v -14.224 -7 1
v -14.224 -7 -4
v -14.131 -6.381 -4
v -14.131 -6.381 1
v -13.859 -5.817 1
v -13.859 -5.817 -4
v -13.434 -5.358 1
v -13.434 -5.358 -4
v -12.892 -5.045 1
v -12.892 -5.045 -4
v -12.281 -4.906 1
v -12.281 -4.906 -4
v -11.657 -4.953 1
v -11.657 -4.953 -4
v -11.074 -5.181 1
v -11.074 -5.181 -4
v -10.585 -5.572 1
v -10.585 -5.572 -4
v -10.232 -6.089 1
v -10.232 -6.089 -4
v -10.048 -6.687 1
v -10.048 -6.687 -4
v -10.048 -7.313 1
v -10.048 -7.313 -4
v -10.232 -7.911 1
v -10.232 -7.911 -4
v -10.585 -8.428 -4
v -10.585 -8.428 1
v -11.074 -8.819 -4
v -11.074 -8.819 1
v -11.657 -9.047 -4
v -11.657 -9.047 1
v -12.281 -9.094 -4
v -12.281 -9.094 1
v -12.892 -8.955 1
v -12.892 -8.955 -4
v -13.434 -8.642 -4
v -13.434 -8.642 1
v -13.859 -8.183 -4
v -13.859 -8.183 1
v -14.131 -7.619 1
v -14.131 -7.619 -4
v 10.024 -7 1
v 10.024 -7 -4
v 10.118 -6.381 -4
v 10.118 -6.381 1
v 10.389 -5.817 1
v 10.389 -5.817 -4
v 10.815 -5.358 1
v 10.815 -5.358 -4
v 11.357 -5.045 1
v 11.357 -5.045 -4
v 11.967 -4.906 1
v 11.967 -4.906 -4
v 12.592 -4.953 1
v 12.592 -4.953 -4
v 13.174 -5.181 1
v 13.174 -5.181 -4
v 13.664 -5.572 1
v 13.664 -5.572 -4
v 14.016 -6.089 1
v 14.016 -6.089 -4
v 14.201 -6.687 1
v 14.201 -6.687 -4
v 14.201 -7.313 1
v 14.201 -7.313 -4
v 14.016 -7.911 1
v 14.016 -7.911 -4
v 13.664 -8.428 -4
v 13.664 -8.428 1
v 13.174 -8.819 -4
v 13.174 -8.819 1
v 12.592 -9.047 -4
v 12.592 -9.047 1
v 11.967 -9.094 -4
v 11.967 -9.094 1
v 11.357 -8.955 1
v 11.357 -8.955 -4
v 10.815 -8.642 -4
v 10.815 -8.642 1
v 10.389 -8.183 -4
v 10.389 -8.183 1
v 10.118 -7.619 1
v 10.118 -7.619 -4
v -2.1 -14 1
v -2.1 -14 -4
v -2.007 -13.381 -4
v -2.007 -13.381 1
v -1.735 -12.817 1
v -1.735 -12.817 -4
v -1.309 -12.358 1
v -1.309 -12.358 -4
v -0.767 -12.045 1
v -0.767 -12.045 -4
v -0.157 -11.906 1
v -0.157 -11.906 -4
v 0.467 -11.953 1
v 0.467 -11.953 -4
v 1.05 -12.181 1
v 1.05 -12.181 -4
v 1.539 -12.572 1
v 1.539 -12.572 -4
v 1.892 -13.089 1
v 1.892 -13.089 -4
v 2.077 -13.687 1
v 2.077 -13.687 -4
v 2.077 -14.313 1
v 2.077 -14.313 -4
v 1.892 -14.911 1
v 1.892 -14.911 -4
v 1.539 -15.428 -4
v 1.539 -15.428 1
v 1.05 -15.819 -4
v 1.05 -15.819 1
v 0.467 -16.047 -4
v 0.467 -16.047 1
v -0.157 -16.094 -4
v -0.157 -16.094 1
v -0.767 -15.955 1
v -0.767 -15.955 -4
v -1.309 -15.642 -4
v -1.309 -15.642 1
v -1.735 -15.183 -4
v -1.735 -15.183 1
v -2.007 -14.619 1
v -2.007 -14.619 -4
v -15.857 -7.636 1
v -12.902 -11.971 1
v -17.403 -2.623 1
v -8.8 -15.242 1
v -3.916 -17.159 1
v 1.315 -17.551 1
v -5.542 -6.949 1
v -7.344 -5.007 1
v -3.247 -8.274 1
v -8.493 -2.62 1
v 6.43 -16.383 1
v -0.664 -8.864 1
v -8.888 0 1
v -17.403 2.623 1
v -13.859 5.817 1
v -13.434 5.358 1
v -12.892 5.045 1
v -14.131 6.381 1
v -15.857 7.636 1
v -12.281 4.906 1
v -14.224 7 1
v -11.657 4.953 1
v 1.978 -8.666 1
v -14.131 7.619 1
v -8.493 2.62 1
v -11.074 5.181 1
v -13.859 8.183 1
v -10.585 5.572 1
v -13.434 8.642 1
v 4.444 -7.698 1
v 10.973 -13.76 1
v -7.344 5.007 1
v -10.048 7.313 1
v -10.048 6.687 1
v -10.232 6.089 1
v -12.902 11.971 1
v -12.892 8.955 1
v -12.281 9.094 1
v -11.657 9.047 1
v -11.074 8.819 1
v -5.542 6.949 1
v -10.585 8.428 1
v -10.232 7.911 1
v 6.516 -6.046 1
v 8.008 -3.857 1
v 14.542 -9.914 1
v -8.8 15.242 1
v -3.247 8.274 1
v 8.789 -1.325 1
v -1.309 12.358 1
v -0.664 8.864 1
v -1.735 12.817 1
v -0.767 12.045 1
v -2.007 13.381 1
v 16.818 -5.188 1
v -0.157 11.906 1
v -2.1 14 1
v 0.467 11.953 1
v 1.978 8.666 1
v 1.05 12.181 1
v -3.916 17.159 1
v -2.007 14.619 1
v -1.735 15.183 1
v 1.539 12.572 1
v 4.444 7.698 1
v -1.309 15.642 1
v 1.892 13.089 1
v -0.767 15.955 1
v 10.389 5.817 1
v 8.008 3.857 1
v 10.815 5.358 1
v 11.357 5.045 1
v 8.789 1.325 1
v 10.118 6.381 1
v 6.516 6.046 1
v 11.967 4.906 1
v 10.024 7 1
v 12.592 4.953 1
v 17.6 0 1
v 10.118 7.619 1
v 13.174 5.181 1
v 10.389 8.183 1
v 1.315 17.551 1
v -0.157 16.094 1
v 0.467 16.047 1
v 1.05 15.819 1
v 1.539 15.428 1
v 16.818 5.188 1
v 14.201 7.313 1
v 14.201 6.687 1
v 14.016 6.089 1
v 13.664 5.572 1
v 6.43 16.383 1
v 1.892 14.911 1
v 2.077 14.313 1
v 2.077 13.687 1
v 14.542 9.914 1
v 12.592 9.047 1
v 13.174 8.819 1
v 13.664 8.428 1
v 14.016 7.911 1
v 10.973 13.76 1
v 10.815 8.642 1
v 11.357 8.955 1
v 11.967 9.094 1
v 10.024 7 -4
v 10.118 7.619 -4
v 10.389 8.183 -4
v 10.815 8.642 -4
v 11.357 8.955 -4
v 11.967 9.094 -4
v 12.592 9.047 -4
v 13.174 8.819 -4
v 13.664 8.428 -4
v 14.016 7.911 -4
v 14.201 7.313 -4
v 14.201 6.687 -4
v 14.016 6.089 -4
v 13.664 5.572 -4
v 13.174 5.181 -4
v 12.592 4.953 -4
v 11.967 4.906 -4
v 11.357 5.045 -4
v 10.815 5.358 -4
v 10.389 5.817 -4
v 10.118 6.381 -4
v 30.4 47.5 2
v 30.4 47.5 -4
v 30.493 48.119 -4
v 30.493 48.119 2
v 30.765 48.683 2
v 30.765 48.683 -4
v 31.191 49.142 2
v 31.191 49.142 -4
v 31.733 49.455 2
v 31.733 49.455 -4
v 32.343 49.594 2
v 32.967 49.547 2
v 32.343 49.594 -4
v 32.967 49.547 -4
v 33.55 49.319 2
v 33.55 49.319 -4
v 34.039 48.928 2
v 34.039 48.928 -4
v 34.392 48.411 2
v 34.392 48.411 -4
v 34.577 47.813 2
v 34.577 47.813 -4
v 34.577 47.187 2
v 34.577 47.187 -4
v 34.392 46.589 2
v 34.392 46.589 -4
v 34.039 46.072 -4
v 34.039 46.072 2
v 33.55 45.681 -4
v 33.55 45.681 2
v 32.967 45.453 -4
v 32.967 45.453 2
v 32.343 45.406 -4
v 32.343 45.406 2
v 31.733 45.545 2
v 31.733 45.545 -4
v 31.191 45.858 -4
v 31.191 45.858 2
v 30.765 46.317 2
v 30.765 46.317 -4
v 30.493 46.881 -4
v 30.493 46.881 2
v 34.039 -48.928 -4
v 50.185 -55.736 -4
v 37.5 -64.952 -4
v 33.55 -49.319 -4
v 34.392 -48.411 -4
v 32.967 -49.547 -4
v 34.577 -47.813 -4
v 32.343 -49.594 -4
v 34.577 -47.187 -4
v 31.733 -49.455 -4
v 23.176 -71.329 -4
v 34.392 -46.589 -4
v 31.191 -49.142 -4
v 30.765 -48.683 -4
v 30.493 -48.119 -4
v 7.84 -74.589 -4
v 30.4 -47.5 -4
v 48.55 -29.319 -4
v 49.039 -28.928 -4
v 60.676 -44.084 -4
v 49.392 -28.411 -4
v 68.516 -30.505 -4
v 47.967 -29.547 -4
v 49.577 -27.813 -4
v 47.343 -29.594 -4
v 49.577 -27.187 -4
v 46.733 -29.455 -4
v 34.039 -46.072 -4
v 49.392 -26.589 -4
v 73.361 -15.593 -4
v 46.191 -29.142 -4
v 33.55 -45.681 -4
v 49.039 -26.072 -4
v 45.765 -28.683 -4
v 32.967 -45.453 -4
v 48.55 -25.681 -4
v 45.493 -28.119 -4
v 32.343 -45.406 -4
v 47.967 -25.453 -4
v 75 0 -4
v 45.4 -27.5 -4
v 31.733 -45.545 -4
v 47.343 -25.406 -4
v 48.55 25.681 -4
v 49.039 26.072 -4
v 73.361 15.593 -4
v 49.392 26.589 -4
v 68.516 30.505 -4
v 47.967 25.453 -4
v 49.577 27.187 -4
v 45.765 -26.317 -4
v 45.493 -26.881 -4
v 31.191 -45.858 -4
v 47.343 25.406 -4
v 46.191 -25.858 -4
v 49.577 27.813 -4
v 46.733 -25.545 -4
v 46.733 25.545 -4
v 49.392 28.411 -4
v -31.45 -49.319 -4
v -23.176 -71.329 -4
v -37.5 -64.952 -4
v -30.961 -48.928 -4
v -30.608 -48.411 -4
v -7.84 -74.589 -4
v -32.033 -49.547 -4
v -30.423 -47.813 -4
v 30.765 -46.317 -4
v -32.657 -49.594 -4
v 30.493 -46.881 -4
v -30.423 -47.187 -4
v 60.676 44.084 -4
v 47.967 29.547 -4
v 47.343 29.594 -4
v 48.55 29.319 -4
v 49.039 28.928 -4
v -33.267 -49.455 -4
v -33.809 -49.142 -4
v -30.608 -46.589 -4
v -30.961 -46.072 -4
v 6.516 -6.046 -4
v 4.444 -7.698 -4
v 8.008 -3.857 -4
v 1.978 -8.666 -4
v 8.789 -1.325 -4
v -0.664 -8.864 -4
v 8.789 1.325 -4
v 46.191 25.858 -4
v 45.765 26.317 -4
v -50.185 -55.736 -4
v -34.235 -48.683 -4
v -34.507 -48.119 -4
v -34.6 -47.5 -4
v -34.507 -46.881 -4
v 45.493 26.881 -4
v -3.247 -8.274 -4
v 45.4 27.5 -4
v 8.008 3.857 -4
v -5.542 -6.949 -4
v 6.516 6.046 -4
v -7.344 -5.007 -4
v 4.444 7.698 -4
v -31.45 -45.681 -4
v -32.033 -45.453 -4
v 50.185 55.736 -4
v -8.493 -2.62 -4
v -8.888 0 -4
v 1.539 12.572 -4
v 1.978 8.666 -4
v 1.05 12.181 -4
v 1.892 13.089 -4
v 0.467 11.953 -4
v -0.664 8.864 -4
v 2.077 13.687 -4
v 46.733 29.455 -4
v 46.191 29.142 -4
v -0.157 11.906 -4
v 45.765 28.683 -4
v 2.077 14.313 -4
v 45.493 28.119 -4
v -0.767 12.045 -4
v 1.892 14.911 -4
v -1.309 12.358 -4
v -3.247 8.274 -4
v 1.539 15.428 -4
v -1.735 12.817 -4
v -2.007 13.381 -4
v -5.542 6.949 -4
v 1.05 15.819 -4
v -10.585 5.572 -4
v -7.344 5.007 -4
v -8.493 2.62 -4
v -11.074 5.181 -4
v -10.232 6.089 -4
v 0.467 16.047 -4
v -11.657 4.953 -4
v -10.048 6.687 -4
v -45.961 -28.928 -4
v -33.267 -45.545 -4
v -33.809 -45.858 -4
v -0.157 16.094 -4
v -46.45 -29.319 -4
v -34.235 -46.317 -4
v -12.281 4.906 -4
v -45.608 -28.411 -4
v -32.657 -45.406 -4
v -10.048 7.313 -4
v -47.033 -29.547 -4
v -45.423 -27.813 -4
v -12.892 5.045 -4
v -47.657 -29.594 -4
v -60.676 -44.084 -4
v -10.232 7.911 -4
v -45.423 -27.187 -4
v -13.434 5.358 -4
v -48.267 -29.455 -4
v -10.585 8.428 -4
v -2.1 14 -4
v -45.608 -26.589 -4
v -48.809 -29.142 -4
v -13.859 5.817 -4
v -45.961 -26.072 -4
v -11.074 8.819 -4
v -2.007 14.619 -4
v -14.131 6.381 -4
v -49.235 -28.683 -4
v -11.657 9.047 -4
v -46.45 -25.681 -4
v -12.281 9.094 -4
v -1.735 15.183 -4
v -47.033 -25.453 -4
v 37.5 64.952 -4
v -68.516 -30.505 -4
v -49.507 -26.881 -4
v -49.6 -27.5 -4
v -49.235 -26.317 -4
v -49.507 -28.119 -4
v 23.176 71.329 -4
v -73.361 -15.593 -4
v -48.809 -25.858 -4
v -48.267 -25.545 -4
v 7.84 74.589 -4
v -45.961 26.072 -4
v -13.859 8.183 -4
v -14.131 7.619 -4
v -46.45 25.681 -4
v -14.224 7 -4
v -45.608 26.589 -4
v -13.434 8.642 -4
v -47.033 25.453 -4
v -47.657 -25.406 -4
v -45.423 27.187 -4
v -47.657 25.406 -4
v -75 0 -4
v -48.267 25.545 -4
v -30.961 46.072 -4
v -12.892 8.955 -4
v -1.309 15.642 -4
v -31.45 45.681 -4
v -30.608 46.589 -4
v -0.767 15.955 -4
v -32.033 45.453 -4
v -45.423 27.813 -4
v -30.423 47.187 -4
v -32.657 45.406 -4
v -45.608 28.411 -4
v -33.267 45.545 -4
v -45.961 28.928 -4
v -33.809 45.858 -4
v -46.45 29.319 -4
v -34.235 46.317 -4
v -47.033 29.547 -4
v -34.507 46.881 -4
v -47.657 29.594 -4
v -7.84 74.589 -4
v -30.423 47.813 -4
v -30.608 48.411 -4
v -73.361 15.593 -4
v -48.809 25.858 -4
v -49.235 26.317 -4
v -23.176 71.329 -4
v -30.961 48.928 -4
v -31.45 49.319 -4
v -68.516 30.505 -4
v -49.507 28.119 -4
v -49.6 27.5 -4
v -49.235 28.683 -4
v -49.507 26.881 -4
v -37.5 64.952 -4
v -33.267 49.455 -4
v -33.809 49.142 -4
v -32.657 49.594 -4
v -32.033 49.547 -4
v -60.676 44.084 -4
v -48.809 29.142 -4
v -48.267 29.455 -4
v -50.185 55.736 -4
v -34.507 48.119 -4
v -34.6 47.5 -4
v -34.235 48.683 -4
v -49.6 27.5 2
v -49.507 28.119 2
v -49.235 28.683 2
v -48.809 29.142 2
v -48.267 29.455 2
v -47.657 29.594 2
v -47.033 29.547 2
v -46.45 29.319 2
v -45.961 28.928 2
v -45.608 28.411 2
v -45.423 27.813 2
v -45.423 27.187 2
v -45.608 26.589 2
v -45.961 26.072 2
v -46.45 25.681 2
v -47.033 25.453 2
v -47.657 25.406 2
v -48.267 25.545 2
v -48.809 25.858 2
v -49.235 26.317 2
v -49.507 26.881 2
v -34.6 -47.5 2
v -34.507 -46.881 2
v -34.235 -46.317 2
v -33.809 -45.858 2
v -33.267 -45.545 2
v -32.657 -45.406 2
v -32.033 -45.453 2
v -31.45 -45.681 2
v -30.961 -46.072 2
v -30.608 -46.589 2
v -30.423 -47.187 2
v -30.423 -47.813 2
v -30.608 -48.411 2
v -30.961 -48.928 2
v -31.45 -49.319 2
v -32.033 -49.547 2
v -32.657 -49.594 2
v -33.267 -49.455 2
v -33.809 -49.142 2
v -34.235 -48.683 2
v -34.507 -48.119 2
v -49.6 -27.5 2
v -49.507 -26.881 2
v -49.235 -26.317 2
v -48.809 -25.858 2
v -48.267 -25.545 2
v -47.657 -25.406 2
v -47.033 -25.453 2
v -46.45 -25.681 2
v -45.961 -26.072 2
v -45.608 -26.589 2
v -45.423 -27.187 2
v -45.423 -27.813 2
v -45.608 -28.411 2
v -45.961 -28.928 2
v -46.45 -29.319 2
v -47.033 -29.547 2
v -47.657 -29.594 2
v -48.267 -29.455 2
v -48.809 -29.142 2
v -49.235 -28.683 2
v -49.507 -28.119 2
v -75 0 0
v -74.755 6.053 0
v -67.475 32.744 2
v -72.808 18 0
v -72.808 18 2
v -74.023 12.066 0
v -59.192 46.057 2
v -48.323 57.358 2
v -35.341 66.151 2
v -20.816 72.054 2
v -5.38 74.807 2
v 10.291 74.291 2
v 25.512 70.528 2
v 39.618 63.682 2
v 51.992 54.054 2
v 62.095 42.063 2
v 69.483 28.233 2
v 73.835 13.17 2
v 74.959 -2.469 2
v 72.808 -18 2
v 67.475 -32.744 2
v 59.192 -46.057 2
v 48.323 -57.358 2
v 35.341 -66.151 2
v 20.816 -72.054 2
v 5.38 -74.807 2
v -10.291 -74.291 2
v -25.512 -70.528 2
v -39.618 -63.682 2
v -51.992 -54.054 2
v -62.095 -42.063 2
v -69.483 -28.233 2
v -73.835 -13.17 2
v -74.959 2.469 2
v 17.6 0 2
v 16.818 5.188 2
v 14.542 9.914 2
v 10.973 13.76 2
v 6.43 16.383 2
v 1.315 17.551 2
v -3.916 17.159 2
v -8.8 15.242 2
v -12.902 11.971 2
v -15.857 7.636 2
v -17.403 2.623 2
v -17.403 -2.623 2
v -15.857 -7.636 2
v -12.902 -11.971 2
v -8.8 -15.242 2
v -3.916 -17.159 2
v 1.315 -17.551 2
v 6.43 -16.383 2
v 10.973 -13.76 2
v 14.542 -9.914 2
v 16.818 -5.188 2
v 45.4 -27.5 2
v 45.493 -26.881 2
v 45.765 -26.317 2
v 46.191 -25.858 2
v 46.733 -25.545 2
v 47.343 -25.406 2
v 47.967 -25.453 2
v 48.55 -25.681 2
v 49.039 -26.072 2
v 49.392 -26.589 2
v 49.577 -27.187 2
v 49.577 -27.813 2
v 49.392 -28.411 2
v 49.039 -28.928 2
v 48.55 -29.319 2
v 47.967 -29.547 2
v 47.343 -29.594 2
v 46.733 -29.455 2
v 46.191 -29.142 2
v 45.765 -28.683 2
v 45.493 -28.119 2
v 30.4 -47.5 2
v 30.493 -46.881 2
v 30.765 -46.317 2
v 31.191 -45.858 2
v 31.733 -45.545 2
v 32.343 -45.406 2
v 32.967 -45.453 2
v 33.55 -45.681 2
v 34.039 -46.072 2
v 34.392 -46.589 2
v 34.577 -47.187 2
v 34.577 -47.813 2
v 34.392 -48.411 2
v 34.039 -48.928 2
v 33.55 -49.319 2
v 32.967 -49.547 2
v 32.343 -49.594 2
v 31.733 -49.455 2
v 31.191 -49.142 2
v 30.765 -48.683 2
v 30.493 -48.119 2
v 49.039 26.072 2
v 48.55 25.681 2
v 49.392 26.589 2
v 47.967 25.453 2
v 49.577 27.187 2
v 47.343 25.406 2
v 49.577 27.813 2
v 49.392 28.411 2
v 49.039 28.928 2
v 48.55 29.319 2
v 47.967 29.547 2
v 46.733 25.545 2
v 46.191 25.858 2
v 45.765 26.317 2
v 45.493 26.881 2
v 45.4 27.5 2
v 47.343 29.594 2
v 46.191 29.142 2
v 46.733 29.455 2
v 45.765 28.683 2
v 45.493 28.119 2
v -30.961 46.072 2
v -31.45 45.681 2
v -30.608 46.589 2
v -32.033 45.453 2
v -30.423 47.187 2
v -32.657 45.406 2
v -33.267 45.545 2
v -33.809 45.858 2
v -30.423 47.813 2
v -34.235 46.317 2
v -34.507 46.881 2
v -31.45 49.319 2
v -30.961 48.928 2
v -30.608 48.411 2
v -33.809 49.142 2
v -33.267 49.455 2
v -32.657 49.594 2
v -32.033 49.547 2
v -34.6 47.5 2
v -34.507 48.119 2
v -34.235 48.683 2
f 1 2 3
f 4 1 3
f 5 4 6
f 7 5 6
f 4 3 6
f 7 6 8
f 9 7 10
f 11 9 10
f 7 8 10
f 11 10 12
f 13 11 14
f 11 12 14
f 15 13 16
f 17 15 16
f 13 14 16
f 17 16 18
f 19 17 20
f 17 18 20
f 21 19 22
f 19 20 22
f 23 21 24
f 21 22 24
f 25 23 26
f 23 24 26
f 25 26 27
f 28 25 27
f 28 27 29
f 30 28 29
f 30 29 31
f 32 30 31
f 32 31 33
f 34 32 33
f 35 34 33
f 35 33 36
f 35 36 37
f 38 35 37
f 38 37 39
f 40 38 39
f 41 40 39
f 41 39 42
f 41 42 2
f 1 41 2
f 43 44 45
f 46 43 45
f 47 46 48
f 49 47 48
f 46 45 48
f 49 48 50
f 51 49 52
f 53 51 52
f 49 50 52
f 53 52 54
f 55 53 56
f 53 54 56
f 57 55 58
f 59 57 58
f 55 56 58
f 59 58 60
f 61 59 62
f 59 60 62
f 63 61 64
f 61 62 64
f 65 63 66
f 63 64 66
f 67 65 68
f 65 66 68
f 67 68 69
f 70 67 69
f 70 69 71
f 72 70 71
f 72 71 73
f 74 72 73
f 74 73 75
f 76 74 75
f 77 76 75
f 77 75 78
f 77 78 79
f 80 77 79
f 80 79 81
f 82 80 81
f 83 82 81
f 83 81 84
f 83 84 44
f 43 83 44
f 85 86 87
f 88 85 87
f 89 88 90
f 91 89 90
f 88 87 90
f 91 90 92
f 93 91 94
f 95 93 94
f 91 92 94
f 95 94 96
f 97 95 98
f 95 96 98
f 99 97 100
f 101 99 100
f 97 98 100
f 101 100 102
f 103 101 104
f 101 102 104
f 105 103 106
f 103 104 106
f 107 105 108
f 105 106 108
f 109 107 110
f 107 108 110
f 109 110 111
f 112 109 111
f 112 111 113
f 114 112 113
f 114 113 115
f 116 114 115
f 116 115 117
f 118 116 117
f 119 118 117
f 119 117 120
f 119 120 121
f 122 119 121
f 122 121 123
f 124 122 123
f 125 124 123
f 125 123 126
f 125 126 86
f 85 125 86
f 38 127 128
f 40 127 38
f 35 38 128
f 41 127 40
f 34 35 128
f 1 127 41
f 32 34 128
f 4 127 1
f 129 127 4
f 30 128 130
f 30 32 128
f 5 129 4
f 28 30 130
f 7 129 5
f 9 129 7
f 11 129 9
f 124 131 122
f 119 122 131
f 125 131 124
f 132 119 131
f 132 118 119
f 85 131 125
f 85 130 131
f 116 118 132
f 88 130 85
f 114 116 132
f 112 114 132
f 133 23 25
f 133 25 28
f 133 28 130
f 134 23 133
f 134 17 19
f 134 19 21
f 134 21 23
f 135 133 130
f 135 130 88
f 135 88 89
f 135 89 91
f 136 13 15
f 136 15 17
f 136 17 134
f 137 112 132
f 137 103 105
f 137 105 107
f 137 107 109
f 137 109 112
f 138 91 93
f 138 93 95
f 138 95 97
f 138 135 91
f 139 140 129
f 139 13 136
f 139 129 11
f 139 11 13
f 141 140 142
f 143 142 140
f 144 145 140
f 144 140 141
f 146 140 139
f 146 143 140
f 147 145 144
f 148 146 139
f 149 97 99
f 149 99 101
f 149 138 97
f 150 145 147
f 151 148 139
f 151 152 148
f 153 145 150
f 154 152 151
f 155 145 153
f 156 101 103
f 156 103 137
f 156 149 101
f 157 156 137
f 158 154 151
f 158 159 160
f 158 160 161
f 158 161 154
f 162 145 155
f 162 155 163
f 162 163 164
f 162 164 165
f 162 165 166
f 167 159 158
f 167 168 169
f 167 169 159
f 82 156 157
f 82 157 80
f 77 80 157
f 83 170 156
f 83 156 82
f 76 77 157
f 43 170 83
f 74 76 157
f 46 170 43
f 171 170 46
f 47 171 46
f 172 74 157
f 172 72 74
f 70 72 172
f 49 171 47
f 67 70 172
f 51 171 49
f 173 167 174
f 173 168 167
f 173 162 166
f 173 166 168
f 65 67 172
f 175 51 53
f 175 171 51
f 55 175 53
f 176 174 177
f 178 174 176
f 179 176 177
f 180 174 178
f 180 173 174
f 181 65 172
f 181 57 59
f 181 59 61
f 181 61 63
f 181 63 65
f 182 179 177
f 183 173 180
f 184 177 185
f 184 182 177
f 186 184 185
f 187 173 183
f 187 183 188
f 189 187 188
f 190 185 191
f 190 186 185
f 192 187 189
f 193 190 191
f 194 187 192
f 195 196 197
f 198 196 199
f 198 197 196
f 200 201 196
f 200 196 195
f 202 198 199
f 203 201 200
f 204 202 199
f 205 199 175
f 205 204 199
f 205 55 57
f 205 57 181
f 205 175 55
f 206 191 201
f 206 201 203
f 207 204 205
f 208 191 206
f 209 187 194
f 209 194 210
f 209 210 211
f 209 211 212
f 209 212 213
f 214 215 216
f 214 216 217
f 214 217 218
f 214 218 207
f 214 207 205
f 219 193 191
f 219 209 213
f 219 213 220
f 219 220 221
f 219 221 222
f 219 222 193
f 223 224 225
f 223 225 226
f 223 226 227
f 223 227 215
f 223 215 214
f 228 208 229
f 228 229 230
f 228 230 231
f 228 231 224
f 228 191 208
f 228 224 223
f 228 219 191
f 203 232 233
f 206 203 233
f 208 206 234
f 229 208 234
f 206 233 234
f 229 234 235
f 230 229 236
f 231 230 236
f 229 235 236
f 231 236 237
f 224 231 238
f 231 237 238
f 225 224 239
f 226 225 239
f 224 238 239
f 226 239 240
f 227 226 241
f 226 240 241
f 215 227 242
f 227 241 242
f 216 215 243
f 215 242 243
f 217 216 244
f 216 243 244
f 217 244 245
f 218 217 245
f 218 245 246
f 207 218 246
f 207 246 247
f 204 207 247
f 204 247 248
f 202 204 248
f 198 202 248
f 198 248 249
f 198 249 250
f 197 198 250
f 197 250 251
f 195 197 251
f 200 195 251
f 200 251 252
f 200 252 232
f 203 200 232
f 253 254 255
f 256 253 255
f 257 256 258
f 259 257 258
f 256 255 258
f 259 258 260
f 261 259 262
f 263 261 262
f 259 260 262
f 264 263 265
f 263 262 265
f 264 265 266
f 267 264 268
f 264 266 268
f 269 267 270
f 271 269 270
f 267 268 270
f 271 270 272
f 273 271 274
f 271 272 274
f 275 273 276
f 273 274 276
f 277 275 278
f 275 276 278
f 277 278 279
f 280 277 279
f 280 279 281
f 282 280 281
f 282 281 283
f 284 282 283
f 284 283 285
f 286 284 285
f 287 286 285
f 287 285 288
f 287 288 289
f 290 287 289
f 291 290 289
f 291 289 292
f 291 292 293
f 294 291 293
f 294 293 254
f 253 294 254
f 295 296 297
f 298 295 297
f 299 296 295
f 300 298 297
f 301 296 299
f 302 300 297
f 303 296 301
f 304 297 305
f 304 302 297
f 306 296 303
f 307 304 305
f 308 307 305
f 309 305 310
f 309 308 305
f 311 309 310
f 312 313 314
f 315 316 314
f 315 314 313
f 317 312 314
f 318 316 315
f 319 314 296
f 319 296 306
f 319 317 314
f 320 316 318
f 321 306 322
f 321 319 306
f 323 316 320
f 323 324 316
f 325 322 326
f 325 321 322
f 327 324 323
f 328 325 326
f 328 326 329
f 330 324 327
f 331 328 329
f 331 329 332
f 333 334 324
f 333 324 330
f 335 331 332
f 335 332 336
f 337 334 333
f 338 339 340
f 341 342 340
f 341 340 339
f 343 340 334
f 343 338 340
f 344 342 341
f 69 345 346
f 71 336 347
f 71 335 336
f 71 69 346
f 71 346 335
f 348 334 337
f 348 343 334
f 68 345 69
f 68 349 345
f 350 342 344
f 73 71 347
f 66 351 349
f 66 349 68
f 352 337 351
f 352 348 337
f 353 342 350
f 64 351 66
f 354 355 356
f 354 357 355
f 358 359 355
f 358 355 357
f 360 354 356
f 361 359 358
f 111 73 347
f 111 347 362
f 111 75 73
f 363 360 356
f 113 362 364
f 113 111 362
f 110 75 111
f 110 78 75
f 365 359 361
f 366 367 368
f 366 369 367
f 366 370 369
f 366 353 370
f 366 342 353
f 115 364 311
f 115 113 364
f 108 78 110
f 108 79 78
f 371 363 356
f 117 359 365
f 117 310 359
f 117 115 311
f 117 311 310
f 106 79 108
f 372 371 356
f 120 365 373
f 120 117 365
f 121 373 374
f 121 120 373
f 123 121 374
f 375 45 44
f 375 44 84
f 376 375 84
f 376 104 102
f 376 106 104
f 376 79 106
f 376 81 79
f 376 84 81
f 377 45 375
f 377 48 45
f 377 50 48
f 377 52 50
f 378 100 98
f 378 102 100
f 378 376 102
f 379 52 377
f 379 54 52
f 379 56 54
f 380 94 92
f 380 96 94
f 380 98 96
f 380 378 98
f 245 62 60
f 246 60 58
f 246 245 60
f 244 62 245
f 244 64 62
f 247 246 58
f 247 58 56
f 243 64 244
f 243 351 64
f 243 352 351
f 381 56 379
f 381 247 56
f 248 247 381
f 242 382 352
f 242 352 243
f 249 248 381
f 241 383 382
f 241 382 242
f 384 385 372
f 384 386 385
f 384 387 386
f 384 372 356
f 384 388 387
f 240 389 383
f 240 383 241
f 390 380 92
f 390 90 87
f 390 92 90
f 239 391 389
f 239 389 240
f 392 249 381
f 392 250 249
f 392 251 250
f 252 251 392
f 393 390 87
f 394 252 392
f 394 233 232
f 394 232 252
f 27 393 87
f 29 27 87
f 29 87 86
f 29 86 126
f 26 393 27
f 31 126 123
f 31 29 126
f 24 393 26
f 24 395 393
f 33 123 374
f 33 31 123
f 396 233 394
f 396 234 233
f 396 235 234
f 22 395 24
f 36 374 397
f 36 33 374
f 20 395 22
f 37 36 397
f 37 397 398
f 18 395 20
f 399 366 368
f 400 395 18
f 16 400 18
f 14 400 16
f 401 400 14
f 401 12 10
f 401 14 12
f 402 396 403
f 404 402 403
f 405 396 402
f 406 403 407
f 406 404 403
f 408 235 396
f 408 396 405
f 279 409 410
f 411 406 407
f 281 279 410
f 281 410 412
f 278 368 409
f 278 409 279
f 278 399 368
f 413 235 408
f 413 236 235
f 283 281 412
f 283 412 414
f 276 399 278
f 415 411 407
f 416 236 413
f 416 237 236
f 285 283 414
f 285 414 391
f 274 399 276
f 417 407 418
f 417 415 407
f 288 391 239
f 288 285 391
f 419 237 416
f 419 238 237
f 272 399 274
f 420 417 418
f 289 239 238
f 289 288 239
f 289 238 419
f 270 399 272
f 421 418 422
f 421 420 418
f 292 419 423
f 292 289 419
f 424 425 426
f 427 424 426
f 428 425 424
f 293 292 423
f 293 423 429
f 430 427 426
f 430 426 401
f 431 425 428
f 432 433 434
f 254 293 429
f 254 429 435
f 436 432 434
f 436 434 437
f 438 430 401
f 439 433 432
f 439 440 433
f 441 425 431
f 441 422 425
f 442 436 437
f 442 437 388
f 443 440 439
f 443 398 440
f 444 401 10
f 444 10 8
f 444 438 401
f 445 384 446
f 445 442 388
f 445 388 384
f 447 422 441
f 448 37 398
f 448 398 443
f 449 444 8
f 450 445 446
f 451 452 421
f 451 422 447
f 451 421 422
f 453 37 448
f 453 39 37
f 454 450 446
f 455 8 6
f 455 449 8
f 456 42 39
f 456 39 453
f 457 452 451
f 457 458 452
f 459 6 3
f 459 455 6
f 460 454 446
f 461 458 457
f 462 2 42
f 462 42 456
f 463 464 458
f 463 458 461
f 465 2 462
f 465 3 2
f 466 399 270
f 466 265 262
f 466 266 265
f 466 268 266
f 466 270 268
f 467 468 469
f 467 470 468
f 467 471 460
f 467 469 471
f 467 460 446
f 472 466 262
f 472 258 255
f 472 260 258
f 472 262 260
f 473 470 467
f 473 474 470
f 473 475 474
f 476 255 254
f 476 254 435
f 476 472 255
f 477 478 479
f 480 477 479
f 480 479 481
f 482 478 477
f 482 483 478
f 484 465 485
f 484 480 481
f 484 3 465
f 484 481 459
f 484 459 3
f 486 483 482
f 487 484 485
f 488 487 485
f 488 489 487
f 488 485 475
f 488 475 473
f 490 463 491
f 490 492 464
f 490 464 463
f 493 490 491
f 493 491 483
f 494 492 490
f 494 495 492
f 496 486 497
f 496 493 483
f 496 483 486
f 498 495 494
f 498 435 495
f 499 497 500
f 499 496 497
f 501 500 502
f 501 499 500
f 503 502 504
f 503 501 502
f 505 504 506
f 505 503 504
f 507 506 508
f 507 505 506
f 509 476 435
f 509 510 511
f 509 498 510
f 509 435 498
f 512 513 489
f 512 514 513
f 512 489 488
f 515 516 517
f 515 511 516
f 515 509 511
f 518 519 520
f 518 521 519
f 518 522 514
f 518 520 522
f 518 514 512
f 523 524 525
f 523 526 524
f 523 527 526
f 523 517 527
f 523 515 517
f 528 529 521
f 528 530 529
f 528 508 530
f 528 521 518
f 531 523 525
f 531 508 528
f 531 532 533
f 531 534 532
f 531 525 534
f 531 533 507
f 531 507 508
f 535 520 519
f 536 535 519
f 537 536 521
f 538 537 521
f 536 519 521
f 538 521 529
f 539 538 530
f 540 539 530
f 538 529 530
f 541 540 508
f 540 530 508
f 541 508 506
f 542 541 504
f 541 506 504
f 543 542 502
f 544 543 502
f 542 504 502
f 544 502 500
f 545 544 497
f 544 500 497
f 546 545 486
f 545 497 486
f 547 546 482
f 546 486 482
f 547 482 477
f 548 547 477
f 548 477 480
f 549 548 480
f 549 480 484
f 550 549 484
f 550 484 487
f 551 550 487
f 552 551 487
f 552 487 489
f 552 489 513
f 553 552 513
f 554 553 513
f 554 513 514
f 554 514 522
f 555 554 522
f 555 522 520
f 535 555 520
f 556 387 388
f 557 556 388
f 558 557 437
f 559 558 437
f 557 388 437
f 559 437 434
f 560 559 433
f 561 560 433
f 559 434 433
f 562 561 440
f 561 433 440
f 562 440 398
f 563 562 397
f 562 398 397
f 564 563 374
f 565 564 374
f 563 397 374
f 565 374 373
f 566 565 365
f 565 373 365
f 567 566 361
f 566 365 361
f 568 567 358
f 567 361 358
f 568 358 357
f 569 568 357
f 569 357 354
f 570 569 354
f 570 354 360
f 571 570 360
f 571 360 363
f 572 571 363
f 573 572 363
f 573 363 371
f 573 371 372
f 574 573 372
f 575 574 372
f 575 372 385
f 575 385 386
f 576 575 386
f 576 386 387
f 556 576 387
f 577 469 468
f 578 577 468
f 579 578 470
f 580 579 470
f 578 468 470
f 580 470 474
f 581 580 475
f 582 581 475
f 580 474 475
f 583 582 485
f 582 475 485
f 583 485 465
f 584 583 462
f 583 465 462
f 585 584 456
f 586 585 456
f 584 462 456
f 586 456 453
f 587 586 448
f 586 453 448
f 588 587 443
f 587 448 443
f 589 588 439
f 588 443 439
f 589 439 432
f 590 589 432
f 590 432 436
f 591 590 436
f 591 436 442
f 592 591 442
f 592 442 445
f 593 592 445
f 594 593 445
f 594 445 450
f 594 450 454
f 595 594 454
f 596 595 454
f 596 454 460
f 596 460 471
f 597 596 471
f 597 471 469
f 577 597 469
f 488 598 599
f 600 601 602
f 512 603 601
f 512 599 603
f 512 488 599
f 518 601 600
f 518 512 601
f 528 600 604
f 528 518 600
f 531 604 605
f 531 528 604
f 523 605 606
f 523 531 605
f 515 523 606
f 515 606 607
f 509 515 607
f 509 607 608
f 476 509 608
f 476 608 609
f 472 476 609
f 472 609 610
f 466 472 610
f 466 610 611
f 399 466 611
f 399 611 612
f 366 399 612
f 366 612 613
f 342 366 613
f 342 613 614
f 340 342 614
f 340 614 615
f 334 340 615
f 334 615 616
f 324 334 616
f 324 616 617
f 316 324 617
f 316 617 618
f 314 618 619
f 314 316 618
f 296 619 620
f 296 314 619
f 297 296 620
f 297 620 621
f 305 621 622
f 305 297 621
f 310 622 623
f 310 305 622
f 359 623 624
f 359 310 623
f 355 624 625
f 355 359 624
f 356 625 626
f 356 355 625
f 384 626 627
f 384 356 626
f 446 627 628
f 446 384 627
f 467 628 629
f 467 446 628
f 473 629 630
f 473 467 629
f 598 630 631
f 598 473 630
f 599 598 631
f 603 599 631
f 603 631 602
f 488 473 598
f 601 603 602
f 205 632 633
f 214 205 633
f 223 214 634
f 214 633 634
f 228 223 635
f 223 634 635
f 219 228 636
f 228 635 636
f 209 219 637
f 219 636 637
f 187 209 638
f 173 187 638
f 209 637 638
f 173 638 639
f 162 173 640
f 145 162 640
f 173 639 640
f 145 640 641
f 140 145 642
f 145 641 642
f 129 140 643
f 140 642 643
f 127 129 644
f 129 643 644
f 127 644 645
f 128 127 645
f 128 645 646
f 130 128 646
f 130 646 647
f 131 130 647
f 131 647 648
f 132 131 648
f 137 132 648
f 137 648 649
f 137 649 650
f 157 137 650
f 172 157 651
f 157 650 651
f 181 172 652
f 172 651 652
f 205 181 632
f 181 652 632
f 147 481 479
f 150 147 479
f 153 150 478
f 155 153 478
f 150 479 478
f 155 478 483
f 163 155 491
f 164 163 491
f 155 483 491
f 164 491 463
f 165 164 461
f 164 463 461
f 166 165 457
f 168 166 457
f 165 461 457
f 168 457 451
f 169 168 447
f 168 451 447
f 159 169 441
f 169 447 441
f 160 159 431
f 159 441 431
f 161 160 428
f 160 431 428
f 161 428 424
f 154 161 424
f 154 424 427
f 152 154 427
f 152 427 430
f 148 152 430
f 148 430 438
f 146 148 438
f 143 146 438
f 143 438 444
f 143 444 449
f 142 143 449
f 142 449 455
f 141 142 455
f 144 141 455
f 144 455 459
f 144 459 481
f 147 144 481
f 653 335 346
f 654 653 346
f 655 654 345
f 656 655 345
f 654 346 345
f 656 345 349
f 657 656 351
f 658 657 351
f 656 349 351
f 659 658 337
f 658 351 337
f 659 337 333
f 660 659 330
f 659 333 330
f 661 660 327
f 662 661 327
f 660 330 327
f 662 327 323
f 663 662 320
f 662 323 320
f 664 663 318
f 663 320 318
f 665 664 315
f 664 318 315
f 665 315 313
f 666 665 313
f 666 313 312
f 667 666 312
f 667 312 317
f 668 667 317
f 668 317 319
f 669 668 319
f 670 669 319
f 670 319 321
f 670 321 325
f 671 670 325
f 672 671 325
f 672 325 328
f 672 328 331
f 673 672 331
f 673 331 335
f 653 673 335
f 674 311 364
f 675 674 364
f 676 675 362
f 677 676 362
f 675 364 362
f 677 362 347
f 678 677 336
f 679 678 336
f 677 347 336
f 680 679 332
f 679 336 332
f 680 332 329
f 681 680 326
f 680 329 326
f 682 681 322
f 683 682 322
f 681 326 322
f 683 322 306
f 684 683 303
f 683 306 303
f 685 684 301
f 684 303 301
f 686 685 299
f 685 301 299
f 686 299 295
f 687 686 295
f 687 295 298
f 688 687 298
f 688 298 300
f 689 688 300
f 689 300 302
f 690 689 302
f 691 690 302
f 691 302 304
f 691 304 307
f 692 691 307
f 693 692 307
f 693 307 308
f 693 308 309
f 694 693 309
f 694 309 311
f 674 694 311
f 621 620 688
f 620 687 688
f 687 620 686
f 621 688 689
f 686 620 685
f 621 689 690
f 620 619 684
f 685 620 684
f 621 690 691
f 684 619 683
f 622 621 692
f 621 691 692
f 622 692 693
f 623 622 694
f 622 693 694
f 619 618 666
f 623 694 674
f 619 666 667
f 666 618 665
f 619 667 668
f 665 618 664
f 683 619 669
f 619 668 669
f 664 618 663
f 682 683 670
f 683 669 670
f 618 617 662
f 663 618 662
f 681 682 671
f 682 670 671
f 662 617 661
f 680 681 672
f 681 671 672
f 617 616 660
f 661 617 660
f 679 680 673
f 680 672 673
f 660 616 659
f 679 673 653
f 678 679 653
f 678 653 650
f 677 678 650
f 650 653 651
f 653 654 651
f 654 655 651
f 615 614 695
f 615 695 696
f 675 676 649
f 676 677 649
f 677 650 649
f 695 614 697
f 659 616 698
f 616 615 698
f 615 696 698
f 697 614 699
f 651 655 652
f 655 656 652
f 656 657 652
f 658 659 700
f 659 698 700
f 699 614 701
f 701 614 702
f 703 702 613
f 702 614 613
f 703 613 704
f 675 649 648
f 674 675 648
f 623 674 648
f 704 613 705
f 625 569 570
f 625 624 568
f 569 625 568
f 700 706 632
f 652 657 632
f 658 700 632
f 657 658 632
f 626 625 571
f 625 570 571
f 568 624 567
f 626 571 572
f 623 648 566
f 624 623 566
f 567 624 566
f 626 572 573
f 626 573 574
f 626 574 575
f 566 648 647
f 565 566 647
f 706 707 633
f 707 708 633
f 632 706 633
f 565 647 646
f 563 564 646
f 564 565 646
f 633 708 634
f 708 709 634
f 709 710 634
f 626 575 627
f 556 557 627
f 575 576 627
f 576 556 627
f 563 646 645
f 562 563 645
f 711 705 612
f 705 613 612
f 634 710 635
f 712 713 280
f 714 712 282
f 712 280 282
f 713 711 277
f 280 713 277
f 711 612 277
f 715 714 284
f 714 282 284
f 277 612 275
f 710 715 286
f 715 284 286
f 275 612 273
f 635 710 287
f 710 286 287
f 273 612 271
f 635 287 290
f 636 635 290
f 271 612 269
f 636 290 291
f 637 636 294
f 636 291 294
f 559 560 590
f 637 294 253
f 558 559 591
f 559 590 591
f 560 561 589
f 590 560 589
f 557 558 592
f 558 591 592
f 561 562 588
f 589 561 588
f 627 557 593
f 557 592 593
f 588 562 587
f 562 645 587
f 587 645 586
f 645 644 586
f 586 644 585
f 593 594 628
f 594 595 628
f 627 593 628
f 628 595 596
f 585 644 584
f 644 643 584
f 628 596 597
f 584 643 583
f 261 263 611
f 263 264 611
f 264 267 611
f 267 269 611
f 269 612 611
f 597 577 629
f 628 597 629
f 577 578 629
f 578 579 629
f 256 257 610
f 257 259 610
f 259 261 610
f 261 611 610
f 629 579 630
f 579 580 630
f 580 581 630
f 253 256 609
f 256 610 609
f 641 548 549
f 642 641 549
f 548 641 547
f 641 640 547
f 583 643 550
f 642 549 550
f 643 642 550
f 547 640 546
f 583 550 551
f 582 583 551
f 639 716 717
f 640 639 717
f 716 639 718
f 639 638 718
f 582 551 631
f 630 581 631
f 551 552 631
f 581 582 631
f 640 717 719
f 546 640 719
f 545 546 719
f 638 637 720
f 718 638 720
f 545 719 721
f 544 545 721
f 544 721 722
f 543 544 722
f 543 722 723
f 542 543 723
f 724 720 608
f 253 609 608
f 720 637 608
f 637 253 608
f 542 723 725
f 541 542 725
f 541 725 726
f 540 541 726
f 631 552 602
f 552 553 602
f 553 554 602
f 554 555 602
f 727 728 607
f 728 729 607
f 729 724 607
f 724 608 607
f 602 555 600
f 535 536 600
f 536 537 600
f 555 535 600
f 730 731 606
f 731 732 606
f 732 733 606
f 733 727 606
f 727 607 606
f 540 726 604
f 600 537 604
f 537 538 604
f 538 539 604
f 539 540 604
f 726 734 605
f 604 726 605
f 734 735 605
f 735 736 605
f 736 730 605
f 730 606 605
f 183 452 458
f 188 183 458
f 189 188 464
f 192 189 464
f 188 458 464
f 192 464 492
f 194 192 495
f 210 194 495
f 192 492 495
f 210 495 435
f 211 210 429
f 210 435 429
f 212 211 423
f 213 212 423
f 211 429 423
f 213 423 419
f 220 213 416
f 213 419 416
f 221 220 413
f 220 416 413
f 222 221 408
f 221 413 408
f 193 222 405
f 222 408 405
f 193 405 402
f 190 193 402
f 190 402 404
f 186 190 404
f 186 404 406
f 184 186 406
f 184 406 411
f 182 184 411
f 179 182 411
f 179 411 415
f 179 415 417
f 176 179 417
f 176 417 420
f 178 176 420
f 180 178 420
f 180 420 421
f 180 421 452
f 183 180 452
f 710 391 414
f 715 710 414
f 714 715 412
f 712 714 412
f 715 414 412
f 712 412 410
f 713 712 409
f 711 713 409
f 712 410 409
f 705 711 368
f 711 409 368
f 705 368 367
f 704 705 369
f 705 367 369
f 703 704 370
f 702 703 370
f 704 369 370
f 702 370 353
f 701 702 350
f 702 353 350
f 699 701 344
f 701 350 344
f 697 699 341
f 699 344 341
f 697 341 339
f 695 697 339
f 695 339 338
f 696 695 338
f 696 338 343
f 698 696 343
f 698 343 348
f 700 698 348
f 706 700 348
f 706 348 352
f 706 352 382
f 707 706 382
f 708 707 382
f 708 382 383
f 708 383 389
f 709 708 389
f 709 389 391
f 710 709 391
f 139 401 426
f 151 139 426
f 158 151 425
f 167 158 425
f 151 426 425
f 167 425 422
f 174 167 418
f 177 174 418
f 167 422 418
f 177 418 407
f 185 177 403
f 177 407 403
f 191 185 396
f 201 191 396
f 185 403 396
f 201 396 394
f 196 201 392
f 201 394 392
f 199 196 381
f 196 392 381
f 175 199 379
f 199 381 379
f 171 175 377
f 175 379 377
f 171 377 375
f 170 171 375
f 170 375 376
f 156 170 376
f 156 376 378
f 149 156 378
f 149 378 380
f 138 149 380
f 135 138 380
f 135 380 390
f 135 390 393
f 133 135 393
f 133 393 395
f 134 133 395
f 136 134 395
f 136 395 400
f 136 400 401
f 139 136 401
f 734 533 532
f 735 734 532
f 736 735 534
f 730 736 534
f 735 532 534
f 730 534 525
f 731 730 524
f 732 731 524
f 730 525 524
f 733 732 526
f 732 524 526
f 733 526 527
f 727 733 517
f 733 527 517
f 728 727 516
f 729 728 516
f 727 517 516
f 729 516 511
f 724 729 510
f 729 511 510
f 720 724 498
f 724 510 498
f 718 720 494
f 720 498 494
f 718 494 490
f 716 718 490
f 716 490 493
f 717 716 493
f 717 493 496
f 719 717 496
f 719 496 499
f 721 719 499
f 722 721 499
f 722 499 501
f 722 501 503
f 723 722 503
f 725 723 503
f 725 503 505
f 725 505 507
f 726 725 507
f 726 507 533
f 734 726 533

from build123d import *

# Parameters (mm, degrees)
SKETCH_1_R           = 40
EXTRUDE_1_DEPTH      = 2
SKETCH_2_R           = 34
CUT_EXTRUDE_1_DEPTH  = 0.5
SKETCH_3_R           = 17.5
CUT_EXTRUDE_4_DEPTH  = 1
SKETCH_5_R           = 2
CUT_EXTRUDE_5_DEPTH  = 1
SKETCH_6_R           = 8
CUT_EXTRUDE_6_DEPTH  = 10
SKETCH_7_R           = 2.1
CUT_EXTRUDE_7_DEPTH  = 10
SKETCH_8_R           = 70
SKETCH_8_R_2         = 40
EXTRUDE_2_DEPTH      = 2
EXTRUDE_3_DEPTH      = 2
SKETCH_11_R          = 75
SKETCH_11_R_2        = 2.1
SKETCH_11_R_3        = 8
EXTRUDE_4_DEPTH      = 2
SKETCH_13_W          = 95.696329608
SKETCH_13_H          = 36
SKETCH_13_W_2        = 36
SKETCH_13_H_2        = 100.137159233
SKETCH_13_H_3        = 96.241749767
CUT_EXTRUDE_10_DEPTH = 198
SKETCH_11_3_R        = 75
SKETCH_11_3_R_2      = 2.1
SKETCH_11_3_R_3      = 8
EXTRUDE_5_DEPTH      = 2
SKETCH_17_R          = 1.65
CUT_EXTRUDE_12_DEPTH = 280
SKETCH_18_R          = 234.864992374
CUT_EXTRUDE_13_DEPTH = 222
SKETCH_20_R          = 8.888358942
CUT_EXTRUDE_15_DEPTH = 17
SKETCH_28_R          = 17.5
CUT_EXTRUDE_16_DEPTH = 1
SKETCH_34_R          = 17.6
CUT_EXTRUDE_22_DEPTH = 1
SKETCH_30_R          = 2.1
CUT_EXTRUDE_27_DEPTH = 10
SKETCH_33_R          = 2.1
CUT_EXTRUDE_28_DEPTH = 10
EXTRUDE_START        = 4
SKETCH_40_R          = 75
SKETCH_40_R_2        = 8.888358942
SKETCH_40_R_3        = 2.1
EXTRUDE_6_DEPTH      = 4


with BuildPart() as part:
    # 草图1 → 凸台-拉伸1 (new body)
    with BuildSketch(Plane.XY):
        Circle(SKETCH_1_R)
    extrude(amount=EXTRUDE_1_DEPTH)

    # 草图2 → 切除-拉伸1 (cut)
    with BuildSketch(Plane.XY.offset(2)):
        Circle(SKETCH_2_R)
    extrude(amount=-CUT_EXTRUDE_1_DEPTH, mode=Mode.SUBTRACT)

    # 草图3 → 切除-拉伸4 (cut)
    with BuildSketch(Plane.XY.offset(1.5)):
        Circle(SKETCH_3_R)
    extrude(amount=-CUT_EXTRUDE_4_DEPTH, mode=Mode.SUBTRACT)

    # 草图5 → 切除-拉伸5 (cut)
    with BuildSketch(Plane.XY.offset(0.5)):
        with Locations((0, 14)):
            Circle(SKETCH_5_R)
        with Locations((12.124355653, 7)):
            Circle(SKETCH_5_R)
        with Locations((12.124355653, -7)):
            Circle(SKETCH_5_R)
        with Locations((0, -14)):
            Circle(SKETCH_5_R)
        with Locations((-12.124355653, -7)):
            Circle(SKETCH_5_R)
        with Locations((-12.124355653, 7)):
            Circle(SKETCH_5_R)
    extrude(amount=-CUT_EXTRUDE_5_DEPTH, mode=Mode.SUBTRACT)

    # 草图6 → 切除-拉伸6 (cut)
    with BuildSketch(Plane(origin=(0, 0, 0), x_dir=(-1, 0, 0), z_dir=(0, 0, -1))):
        Circle(SKETCH_6_R)
    extrude(amount=-CUT_EXTRUDE_6_DEPTH, mode=Mode.SUBTRACT)

    # 草图7 → 切除-拉伸7 (cut)
    with BuildSketch(Plane(origin=(0, 0, 0), x_dir=(-1, 0, 0), z_dir=(0, 0, -1))):
        with Locations((0, 14)):
            Circle(SKETCH_7_R)
        with Locations((12.124355653, 7)):
            Circle(SKETCH_7_R)
        with Locations((12.124355653, -7)):
            Circle(SKETCH_7_R)
        with Locations((0, -14)):
            Circle(SKETCH_7_R)
        with Locations((-12.124355653, -7)):
            Circle(SKETCH_7_R)
        with Locations((-12.124355653, 7)):
            Circle(SKETCH_7_R)
    extrude(amount=-CUT_EXTRUDE_7_DEPTH, mode=Mode.SUBTRACT)

    # 草图8 → 凸台-拉伸2 (add)
    with BuildSketch(Plane(origin=(0, 0, 0), x_dir=(-1, 0, 0), z_dir=(0, 0, -1))):
        Circle(SKETCH_8_R)
        Circle(SKETCH_8_R_2, mode=Mode.SUBTRACT)
    extrude(amount=-EXTRUDE_2_DEPTH)

    # 草图9 → 凸台-拉伸3 (add)
    with BuildSketch(Plane(origin=(0, 0, 0), x_dir=(-1, 0, 0), z_dir=(0, 0, -1))):
        with BuildLine():
            ThreePointArc((-36.858328143, 59.510197836), (-0.940414163, 69.993682724), (35.246189577, 60.478972547))
            Line((35.246189577, 60.478972547), (35.246189577, 159.510197836))
            Line((35.246189577, 159.510197836), (-36.858328143, 159.510197836))
            Line((-36.858328143, 159.510197836), (-36.858328143, 59.510197836))
        make_face()
        with BuildLine():
            ThreePointArc((-60, -36.055512755), (-70, 0), (-60, 36.055512755))
            Line((-60, 36.055512755), (-160, 36.055512755))
            Line((-160, 36.055512755), (-160, -36.055512755))
            Line((-160, -36.055512755), (-60, -36.055512755))
        make_face()
        with BuildLine():
            Line((160, 36.055512755), (60, 36.055512755))
            ThreePointArc((60, 36.055512755), (70, 0), (60, -36.055512755))
            Line((60, -36.055512755), (160, -36.055512755))
            Line((160, -36.055512755), (160, 36.055512755))
        make_face()
        with BuildLine():
            ThreePointArc((35.246189577, -60.478972547), (-0.940414163, -69.993682724), (-36.858328143, -59.510197836))
            Line((-36.858328143, -59.510197836), (-36.858328143, -160.478972547))
            Line((-36.858328143, -160.478972547), (35.246189577, -160.478972547))
            Line((35.246189577, -160.478972547), (35.246189577, -60.478972547))
        make_face()
    extrude(amount=-EXTRUDE_3_DEPTH)

    # 草图11 → 凸台-拉伸4 (add)
    with BuildSketch(Plane(origin=(0, 0, 0), x_dir=(-1, 0, 0), z_dir=(0, 0, -1))):
        Circle(SKETCH_11_R)
        with Locations((0, -14)):
            Circle(SKETCH_11_R_2, mode=Mode.SUBTRACT)
        with Locations((-12.124355653, -7)):
            Circle(SKETCH_11_R_2, mode=Mode.SUBTRACT)
        with Locations((-12.124355653, 7)):
            Circle(SKETCH_11_R_2, mode=Mode.SUBTRACT)
        Circle(SKETCH_11_R_3, mode=Mode.SUBTRACT)
        with Locations((12.124355653, -7)):
            Circle(SKETCH_11_R_2, mode=Mode.SUBTRACT)
        with Locations((12.124355653, 7)):
            Circle(SKETCH_11_R_2, mode=Mode.SUBTRACT)
        with Locations((0, 14)):
            Circle(SKETCH_11_R_2, mode=Mode.SUBTRACT)
    extrude(amount=-EXTRUDE_4_DEPTH)

    # 草图13 → 切除-拉伸10 (cut)
    with BuildSketch(Plane(origin=(0, 0, 0), x_dir=(-1, 0, 0), z_dir=(0, 0, -1))):
        with Locations((-112.151835196, 0)):
            Rectangle(SKETCH_13_W, SKETCH_13_H)
        with Locations((0, 109.44161822)):
            Rectangle(SKETCH_13_W_2, SKETCH_13_H_2)
        Polygon((160, -18), (160, 18), (157.649128195, 18), (52.463986971, 18), (52.463986971, -18), align=None)
        with Locations((0, -112.358097664)):
            Rectangle(SKETCH_13_W_2, SKETCH_13_H_3)
    extrude(amount=-CUT_EXTRUDE_10_DEPTH, mode=Mode.SUBTRACT)

    # 草图11<3> → 凸台-拉伸5 (add)
    with BuildSketch(Plane(origin=(0, 0, 0), x_dir=(-1, 0, 0), z_dir=(0, 0, -1))):
        Circle(SKETCH_11_3_R)
        with Locations((0, -14)):
            Circle(SKETCH_11_3_R_2, mode=Mode.SUBTRACT)
        with Locations((-12.124355653, -7)):
            Circle(SKETCH_11_3_R_2, mode=Mode.SUBTRACT)
        with Locations((-12.124355653, 7)):
            Circle(SKETCH_11_3_R_2, mode=Mode.SUBTRACT)
        Circle(SKETCH_11_3_R_3, mode=Mode.SUBTRACT)
        with Locations((12.124355653, -7)):
            Circle(SKETCH_11_3_R_2, mode=Mode.SUBTRACT)
        with Locations((12.124355653, 7)):
            Circle(SKETCH_11_3_R_2, mode=Mode.SUBTRACT)
        with Locations((0, 14)):
            Circle(SKETCH_11_3_R_2, mode=Mode.SUBTRACT)
    extrude(amount=-EXTRUDE_5_DEPTH)

    # 草图17 → 切除-拉伸12 (cut)
    with BuildSketch(Plane(origin=(0, 0, 0), x_dir=(-1, 0, 0), z_dir=(0, 0, -1))):
        with Locations((-157.6, 27.027756377)):
            Circle(SKETCH_17_R)
        with Locations((-132.6, 27.027756377)):
            Circle(SKETCH_17_R)
        with Locations((-157.6, -27.027756377)):
            Circle(SKETCH_17_R)
        with Locations((-132.6, -27.027756377)):
            Circle(SKETCH_17_R)
        with Locations((27.027756377, 157.6)):
            Circle(SKETCH_17_R)
        with Locations((27.027756377, 132.6)):
            Circle(SKETCH_17_R)
        with Locations((-27.027756377, 157.6)):
            Circle(SKETCH_17_R)
        with Locations((-27.027756377, 132.6)):
            Circle(SKETCH_17_R)
        with Locations((157.6, 27.027756377)):
            Circle(SKETCH_17_R)
        with Locations((132.6, 27.027756377)):
            Circle(SKETCH_17_R)
        with Locations((-27.027756377, -157.6)):
            Circle(SKETCH_17_R)
        with Locations((-27.027756377, -132.6)):
            Circle(SKETCH_17_R)
        with Locations((27.027756377, -157.6)):
            Circle(SKETCH_17_R)
        with Locations((27.027756377, -132.6)):
            Circle(SKETCH_17_R)
    extrude(amount=-CUT_EXTRUDE_12_DEPTH, mode=Mode.SUBTRACT)

    # 草图18 → 切除-拉伸13 (cut)
    with BuildSketch(Plane(origin=(0, 0, 0), x_dir=(-1, 0, 0), z_dir=(0, 0, -1))):
        Circle(SKETCH_18_R)
        with BuildLine():
            ThreePointArc((72.807966597, -18), (-74.999955067, -0.082097142), (72.768385514, 18.159352128))
            ThreePointArc((72.768385514, 18.159352128), (74.440005755, 9.147980282), (75, 0))
            ThreePointArc((75, 0), (74.449974798, -9.066490645), (72.807966597, -18))
        make_face(mode=Mode.SUBTRACT)
        with BuildLine():
            ThreePointArc((159.25, 27.027756377), (157.6, 25.377756377), (155.95, 27.027756377))
            ThreePointArc((155.95, 27.027756377), (157.6, 28.677756377), (159.25, 27.027756377))
        make_face(mode=Mode.SUBTRACT)
    extrude(amount=-CUT_EXTRUDE_13_DEPTH, mode=Mode.SUBTRACT)

    # 草图20 → 切除-拉伸15 (cut)
    with BuildSketch(Plane(origin=(0, 0, 0), x_dir=(-1, 0, 0), z_dir=(0, 0, -1))):
        Circle(SKETCH_20_R)
    extrude(amount=-CUT_EXTRUDE_15_DEPTH, mode=Mode.SUBTRACT)

    # 草图28 → 切除-拉伸16 (cut)
    with BuildSketch(Plane.XY.offset(2)):
        Circle(SKETCH_28_R)
    extrude(amount=-CUT_EXTRUDE_16_DEPTH, mode=Mode.SUBTRACT)

    # 草图34 → 切除-拉伸22 (cut)
    with BuildSketch(Plane.XY.offset(2)):
        Circle(SKETCH_34_R)
    extrude(amount=-CUT_EXTRUDE_22_DEPTH, mode=Mode.SUBTRACT)

    # 草图30 → 切除-拉伸27 (cut)
    with BuildSketch(Plane(origin=(0, 0, 0), x_dir=(-1, 0, 0), z_dir=(0, 0, -1))):
        with Locations((-32.5, -47.5)):
            Circle(SKETCH_30_R)
        with Locations((32.5, -47.5)):
            Circle(SKETCH_30_R)
        with Locations((-32.5, 47.5)):
            Circle(SKETCH_30_R)
        with Locations((32.5, 47.5)):
            Circle(SKETCH_30_R)
    extrude(amount=-CUT_EXTRUDE_27_DEPTH, mode=Mode.SUBTRACT)

    # 草图33 → 切除-拉伸28 (cut)
    with BuildSketch(Plane(origin=(0, 0, 0), x_dir=(-1, 0, 0), z_dir=(0, 0, -1))):
        with Locations((-47.5, 27.5)):
            Circle(SKETCH_33_R)
        with Locations((-47.5, -27.5)):
            Circle(SKETCH_33_R)
        with Locations((47.5, 27.5)):
            Circle(SKETCH_33_R)
        with Locations((47.5, -27.5)):
            Circle(SKETCH_33_R)
    extrude(amount=-CUT_EXTRUDE_28_DEPTH, mode=Mode.SUBTRACT)

    # 草图40 → 凸台-拉伸6 (add)
    with BuildSketch(Plane(origin=(0, 0, 0), x_dir=(-1, 0, 0), z_dir=(0, 0, -1)).offset(EXTRUDE_START)):
        Circle(SKETCH_40_R)
        Circle(SKETCH_40_R_2, mode=Mode.SUBTRACT)
        with Locations((-12.124355653, 7)):
            Circle(SKETCH_40_R_3, mode=Mode.SUBTRACT)
        with Locations((-12.124355653, -7)):
            Circle(SKETCH_40_R_3, mode=Mode.SUBTRACT)
        with Locations((0, -14)):
            Circle(SKETCH_40_R_3, mode=Mode.SUBTRACT)
        with Locations((12.124355653, -7)):
            Circle(SKETCH_40_R_3, mode=Mode.SUBTRACT)
        with Locations((12.124355653, 7)):
            Circle(SKETCH_40_R_3, mode=Mode.SUBTRACT)
        with Locations((0, 14)):
            Circle(SKETCH_40_R_3, mode=Mode.SUBTRACT)
        with Locations((32.5, 47.5)):
            Circle(SKETCH_40_R_3, mode=Mode.SUBTRACT)
        with Locations((47.5, 27.5)):
            Circle(SKETCH_40_R_3, mode=Mode.SUBTRACT)
        with Locations((47.5, -27.5)):
            Circle(SKETCH_40_R_3, mode=Mode.SUBTRACT)
        with Locations((32.5, -47.5)):
            Circle(SKETCH_40_R_3, mode=Mode.SUBTRACT)
        with Locations((-32.5, -47.5)):
            Circle(SKETCH_40_R_3, mode=Mode.SUBTRACT)
        with Locations((-47.5, -27.5)):
            Circle(SKETCH_40_R_3, mode=Mode.SUBTRACT)
        with Locations((-47.5, 27.5)):
            Circle(SKETCH_40_R_3, mode=Mode.SUBTRACT)
        with Locations((-32.5, 47.5)):
            Circle(SKETCH_40_R_3, mode=Mode.SUBTRACT)
    extrude(amount=-EXTRUDE_6_DEPTH)


solid = part.part
